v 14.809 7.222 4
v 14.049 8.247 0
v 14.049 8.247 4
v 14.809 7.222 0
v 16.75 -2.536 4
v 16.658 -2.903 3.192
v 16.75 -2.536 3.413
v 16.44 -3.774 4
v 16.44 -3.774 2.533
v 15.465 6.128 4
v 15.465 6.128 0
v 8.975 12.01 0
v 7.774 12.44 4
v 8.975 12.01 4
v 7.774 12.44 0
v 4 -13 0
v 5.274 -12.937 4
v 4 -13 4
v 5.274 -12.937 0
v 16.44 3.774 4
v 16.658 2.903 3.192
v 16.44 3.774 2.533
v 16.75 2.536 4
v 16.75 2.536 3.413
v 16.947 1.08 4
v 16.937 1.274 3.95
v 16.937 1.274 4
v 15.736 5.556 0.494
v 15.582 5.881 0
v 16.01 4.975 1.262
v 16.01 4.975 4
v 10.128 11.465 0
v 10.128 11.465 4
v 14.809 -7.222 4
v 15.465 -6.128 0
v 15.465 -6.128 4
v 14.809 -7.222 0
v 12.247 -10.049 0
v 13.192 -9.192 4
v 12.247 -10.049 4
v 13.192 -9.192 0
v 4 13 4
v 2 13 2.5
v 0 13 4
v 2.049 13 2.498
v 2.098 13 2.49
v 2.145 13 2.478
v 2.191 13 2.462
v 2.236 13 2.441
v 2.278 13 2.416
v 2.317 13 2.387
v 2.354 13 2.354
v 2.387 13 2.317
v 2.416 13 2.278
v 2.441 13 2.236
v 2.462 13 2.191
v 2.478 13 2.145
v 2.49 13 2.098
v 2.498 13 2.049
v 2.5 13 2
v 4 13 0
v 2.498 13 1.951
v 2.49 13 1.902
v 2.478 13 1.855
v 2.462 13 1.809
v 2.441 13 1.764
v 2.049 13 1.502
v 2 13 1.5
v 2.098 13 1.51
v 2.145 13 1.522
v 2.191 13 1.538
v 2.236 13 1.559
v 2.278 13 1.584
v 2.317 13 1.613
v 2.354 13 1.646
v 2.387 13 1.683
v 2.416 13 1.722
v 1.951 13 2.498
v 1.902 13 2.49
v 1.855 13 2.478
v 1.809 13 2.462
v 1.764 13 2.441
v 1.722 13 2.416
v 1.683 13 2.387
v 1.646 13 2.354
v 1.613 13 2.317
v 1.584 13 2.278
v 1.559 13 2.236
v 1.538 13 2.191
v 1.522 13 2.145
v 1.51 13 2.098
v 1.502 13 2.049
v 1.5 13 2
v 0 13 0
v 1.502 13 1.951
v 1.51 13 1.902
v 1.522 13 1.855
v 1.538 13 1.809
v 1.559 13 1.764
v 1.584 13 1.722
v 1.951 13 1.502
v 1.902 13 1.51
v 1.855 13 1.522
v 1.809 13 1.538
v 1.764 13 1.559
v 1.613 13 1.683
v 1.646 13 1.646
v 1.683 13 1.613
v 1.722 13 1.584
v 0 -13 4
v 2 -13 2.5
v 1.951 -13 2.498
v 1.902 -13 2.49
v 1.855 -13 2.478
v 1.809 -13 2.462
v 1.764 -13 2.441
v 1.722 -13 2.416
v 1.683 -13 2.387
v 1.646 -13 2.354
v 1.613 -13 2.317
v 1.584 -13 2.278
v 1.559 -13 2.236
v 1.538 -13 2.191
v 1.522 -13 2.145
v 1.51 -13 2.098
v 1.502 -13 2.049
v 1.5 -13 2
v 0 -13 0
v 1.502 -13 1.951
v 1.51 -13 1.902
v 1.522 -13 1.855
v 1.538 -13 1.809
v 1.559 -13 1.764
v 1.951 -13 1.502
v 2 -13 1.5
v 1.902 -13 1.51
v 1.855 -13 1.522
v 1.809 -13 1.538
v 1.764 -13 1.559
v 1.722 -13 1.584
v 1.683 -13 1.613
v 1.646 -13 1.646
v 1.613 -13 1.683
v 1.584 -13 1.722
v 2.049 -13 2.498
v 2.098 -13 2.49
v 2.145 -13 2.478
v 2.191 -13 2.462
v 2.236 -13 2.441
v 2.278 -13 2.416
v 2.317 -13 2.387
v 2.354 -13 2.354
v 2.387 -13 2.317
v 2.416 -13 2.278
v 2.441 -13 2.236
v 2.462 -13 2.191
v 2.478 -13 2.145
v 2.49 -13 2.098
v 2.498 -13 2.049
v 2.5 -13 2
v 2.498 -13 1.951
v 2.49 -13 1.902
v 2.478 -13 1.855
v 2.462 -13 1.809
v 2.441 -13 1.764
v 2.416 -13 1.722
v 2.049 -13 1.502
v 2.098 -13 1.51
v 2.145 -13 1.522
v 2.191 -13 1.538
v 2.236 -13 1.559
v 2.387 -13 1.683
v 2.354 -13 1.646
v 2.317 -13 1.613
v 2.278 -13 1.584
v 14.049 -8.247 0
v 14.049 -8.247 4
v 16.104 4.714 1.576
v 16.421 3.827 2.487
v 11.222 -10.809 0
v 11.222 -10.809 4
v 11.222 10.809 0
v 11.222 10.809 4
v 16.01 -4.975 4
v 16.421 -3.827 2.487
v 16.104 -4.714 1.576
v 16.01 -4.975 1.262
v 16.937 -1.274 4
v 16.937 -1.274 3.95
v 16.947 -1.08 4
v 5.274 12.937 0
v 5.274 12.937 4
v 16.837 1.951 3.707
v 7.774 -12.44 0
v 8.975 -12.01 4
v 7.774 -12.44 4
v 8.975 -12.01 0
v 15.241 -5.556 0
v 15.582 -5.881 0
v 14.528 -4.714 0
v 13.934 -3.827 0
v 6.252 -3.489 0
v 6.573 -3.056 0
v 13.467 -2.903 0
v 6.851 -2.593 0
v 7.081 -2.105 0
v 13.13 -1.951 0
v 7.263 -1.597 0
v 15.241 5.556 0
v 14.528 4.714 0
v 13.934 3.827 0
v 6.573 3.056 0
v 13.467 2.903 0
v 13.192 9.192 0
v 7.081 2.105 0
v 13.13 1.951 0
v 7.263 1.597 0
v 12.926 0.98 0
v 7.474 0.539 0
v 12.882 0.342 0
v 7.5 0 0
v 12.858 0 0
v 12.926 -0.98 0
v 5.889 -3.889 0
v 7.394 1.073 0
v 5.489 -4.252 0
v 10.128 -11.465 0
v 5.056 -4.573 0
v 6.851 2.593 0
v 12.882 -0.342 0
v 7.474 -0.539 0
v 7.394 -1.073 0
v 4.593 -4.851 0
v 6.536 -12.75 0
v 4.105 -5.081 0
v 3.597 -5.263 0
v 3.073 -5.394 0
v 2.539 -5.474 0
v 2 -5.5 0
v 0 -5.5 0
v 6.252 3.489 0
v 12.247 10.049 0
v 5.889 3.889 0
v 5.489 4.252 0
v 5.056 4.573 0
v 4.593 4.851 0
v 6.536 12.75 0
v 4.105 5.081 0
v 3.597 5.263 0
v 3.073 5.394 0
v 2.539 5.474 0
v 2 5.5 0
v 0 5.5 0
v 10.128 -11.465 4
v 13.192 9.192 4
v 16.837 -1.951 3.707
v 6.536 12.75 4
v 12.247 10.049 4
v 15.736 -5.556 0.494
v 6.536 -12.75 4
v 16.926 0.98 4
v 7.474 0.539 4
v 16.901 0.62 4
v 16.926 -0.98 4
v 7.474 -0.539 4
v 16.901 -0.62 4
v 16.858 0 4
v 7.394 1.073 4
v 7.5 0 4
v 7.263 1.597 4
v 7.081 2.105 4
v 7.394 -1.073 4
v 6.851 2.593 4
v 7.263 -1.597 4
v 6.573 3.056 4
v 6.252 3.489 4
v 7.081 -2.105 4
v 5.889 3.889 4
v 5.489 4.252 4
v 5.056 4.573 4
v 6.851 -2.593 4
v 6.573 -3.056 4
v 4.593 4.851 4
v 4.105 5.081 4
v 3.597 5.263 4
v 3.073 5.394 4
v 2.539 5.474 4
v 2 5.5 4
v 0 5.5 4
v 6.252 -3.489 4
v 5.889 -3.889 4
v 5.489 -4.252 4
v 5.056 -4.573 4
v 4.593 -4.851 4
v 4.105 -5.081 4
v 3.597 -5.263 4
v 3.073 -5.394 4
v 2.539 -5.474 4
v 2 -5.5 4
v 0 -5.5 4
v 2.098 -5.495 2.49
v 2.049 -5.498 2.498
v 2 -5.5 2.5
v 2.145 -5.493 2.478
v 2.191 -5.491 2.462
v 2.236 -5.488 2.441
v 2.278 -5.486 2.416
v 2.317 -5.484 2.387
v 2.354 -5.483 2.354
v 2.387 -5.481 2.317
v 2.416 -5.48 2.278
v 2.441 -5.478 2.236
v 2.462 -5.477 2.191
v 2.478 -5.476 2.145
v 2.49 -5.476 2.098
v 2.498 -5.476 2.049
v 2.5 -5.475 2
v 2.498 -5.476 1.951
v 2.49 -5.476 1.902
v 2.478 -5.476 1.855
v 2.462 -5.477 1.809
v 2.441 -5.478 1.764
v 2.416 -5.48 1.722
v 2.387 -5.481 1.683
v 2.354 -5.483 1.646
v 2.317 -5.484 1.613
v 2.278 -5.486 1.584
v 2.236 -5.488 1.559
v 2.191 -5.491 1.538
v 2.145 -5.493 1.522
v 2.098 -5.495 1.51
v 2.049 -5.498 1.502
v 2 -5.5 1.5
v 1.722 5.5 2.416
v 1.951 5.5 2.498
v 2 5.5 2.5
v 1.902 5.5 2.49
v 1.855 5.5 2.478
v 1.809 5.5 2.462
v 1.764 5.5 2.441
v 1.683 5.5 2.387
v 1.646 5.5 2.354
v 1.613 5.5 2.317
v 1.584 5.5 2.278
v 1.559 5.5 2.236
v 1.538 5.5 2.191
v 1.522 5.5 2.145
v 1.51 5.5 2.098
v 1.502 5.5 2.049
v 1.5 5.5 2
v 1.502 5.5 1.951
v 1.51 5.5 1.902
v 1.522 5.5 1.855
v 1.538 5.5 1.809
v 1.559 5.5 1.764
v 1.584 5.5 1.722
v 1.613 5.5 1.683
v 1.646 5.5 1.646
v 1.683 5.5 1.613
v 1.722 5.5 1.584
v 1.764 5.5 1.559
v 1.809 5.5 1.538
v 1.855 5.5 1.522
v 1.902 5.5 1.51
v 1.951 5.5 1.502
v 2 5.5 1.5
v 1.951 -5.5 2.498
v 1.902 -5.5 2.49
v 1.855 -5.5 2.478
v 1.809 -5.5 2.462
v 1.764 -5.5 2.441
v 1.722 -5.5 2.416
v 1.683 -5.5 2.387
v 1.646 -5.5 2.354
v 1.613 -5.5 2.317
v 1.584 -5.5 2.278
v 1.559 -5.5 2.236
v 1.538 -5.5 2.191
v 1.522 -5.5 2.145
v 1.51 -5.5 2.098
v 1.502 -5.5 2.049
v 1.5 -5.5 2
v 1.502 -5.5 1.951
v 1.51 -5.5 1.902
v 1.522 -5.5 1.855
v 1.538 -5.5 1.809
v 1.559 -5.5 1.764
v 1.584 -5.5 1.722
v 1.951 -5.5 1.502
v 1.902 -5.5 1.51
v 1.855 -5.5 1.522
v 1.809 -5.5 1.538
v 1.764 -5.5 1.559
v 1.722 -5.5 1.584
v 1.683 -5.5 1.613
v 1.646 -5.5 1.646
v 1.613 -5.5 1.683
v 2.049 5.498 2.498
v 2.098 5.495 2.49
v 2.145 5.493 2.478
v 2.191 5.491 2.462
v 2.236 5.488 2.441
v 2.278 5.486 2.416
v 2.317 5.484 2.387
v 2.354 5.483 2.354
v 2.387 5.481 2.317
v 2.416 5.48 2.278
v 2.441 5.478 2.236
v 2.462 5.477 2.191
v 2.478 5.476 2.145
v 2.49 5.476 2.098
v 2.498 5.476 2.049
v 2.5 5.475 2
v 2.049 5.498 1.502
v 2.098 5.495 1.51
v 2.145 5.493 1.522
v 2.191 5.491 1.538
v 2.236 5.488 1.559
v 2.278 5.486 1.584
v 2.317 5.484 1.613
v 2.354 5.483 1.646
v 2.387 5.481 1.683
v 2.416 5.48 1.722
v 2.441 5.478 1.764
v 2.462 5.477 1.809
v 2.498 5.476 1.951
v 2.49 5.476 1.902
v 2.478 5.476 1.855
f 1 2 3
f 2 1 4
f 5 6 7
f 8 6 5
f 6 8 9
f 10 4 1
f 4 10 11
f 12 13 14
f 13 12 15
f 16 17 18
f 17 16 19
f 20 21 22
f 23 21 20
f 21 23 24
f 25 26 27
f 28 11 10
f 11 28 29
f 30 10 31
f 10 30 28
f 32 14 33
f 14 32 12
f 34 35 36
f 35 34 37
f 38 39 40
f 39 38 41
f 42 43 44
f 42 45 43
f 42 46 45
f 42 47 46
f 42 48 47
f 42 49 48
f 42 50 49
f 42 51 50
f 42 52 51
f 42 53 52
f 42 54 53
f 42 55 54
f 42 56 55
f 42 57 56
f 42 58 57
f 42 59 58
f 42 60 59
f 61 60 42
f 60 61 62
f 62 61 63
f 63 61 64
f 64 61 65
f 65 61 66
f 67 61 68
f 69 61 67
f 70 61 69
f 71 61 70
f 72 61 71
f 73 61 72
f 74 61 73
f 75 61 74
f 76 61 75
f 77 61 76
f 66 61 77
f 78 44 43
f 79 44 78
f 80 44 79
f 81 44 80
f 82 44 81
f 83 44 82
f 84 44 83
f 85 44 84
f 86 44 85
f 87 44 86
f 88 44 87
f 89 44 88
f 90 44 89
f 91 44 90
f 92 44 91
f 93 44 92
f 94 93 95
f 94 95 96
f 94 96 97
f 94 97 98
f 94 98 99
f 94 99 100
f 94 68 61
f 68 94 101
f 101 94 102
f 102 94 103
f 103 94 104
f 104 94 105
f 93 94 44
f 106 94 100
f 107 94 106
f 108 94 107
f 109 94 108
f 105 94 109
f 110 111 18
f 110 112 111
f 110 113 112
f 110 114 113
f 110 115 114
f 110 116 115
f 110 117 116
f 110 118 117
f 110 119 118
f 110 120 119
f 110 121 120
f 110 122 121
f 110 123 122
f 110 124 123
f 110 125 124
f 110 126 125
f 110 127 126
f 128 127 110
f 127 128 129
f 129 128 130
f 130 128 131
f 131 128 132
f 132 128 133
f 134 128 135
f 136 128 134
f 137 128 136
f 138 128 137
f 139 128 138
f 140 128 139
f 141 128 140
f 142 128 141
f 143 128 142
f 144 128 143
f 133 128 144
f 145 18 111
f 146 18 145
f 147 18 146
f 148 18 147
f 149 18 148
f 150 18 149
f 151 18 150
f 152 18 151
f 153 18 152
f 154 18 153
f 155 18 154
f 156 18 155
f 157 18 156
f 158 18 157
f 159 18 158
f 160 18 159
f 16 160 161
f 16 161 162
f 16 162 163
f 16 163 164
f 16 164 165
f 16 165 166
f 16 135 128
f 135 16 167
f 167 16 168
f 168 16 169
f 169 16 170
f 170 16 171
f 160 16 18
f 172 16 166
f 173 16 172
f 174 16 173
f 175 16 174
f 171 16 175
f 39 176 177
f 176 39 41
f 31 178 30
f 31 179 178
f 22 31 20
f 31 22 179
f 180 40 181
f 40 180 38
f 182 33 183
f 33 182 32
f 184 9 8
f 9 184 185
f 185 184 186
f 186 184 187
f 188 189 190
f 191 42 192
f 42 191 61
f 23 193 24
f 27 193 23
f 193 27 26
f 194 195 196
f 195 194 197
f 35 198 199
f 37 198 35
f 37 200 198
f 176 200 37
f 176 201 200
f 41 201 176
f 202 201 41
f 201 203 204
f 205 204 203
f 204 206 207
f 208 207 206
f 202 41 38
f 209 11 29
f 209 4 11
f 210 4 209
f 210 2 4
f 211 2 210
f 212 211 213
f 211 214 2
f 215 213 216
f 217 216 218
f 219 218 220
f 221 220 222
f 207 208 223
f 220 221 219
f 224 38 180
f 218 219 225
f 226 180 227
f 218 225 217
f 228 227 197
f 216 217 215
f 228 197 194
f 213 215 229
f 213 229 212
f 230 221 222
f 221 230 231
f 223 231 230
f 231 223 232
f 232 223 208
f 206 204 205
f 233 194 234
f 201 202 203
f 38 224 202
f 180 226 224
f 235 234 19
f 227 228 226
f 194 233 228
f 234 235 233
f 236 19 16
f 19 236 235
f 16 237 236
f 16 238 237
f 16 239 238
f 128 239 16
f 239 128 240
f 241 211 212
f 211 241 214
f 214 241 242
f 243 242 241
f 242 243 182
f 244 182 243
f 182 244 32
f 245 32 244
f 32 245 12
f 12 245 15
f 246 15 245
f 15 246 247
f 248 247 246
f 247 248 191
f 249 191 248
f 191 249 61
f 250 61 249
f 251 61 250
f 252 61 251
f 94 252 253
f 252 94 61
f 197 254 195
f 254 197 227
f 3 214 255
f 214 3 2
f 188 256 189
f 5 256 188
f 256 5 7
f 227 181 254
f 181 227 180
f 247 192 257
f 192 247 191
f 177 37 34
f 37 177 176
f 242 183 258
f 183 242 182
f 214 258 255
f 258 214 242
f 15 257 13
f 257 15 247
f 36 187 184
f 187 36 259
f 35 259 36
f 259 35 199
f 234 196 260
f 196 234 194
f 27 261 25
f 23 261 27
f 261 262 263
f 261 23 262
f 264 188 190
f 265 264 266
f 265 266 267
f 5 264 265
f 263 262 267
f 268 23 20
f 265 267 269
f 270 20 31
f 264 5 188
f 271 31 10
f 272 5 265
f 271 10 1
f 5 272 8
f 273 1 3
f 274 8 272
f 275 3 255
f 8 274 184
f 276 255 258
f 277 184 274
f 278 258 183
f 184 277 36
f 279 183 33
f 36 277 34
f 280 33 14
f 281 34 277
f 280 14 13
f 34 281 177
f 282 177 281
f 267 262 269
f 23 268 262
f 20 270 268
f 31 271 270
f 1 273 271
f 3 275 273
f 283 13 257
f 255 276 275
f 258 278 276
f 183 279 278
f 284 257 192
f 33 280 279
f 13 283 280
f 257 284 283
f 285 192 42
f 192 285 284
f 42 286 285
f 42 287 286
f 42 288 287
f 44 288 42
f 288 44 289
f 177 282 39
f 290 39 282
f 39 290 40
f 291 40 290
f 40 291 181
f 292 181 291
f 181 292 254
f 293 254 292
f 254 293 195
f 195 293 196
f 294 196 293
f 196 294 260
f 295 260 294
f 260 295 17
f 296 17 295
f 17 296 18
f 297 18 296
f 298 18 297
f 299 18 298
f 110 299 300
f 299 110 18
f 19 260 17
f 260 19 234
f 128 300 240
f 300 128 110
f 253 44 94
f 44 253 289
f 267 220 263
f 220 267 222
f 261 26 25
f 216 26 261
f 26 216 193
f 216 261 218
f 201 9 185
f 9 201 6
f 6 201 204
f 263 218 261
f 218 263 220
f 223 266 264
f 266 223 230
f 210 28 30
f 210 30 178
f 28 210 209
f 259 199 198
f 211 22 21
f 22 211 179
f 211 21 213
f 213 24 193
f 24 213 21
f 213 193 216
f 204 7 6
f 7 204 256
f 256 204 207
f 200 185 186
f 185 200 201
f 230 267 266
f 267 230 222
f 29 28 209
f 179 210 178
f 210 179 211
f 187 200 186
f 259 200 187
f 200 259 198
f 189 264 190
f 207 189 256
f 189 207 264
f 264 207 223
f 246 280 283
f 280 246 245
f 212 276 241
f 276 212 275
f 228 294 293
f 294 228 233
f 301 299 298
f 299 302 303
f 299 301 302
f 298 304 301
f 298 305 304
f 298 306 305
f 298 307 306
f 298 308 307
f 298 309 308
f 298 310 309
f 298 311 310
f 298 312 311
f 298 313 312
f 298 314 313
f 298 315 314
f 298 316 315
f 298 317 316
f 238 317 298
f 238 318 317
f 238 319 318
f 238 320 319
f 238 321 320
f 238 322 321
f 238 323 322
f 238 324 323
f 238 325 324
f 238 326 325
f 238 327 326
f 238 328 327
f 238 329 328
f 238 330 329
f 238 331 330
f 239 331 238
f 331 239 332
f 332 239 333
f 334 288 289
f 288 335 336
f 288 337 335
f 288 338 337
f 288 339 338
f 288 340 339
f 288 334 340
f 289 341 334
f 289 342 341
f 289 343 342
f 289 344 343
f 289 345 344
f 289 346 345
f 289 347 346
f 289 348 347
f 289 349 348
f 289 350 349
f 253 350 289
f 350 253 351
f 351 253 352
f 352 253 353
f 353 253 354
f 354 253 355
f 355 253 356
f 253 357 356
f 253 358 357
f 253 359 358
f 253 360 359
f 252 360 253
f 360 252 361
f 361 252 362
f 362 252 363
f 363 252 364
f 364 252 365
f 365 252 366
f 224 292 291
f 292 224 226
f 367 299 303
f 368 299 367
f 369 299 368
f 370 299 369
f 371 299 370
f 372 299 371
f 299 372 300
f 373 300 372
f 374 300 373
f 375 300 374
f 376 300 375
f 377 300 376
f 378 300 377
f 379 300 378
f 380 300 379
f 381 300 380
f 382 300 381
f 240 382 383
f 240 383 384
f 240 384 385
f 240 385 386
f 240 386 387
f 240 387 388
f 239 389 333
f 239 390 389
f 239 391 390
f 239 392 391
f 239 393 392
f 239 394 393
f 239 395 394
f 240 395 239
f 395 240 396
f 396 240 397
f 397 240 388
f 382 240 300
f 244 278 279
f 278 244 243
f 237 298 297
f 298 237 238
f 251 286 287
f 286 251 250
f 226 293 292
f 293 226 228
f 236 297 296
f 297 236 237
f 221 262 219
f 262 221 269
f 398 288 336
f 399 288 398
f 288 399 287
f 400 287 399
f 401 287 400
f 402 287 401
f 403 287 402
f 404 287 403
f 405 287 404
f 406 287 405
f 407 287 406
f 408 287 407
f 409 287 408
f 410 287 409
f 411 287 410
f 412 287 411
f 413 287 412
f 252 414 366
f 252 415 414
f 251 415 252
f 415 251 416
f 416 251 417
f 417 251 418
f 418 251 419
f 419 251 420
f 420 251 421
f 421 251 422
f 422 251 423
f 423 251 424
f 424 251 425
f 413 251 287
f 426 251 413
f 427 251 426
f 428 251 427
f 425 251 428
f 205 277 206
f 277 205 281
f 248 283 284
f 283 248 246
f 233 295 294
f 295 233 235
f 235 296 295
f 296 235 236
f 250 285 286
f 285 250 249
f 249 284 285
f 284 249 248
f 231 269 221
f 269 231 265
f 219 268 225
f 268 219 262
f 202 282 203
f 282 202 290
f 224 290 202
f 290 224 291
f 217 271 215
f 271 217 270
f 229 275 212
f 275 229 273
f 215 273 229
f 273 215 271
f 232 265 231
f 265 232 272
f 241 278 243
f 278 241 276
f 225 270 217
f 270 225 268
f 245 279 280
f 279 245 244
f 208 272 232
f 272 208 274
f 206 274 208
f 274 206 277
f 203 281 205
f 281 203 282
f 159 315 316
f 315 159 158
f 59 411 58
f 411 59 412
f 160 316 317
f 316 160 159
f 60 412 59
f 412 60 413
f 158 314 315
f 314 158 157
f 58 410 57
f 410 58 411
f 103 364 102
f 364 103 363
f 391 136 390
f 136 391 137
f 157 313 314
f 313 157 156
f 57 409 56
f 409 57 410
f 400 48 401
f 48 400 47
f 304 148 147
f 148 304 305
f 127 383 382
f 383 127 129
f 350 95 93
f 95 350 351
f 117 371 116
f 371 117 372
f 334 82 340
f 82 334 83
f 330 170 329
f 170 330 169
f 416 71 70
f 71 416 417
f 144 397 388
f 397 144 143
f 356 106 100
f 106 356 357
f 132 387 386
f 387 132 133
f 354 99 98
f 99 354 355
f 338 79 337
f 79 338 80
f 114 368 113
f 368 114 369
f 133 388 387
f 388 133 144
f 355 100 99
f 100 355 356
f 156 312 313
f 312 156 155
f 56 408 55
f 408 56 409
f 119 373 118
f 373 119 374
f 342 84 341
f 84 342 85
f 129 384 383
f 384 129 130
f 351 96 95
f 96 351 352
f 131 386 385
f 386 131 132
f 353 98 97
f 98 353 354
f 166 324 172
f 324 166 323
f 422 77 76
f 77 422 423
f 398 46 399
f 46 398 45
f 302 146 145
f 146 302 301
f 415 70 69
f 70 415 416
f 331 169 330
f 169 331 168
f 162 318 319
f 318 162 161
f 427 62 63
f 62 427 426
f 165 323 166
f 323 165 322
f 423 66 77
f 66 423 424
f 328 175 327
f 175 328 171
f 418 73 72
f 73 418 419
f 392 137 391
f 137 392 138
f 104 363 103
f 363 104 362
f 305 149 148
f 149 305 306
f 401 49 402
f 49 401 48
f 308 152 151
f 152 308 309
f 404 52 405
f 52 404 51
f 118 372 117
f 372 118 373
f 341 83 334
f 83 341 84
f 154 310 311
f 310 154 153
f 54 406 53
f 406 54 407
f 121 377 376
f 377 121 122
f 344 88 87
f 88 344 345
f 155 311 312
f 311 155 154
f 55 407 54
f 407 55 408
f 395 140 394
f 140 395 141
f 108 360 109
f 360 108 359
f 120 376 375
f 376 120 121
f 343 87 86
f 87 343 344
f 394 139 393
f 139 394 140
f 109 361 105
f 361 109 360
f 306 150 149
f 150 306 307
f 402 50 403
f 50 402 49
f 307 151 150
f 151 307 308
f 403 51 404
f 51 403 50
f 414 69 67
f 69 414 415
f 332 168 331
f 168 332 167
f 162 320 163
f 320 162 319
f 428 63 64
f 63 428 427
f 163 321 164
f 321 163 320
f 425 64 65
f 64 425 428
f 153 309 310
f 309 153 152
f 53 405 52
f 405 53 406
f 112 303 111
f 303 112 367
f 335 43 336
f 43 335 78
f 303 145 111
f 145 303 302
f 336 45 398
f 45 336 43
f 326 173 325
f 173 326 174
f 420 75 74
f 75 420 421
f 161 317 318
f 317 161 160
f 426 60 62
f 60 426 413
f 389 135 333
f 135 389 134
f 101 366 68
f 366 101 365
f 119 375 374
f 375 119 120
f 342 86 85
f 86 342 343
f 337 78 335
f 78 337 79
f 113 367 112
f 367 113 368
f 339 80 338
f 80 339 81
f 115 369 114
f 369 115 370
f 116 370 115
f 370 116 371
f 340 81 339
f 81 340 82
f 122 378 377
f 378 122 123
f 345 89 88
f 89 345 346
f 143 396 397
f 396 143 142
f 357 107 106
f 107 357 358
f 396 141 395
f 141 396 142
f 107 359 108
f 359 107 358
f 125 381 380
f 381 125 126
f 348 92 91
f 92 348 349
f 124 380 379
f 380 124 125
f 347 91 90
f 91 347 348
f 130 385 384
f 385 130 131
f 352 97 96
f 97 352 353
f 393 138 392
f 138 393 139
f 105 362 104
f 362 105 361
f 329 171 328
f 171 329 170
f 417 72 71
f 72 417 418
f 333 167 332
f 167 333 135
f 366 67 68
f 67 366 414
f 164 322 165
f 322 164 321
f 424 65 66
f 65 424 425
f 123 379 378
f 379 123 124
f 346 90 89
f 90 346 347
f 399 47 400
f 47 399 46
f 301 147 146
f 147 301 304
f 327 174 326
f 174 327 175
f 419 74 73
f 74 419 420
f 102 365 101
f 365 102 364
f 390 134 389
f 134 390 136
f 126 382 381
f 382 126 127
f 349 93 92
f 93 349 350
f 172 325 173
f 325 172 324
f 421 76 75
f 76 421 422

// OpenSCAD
$fn=64;
corner_radius=5;
height=2;
plate_height=1;
plate_length=44;
plate_width=29.3;
wall_thickness=5;

rotator_mount_diameter=26;

center_x=plate_length/2-corner_radius;
center_y=plate_width/2-corner_radius;

rotator_base_height=1;
rotator_top_diameter=11;

diff=0.1;

difference() {
    hull() {
        cylinder(h=2*height, d=rotator_mount_diameter);
        translate([4,0,0]) cylinder(h=2*height, d=rotator_mount_diameter);
    }
    translate([-30,-15,-1]) cube([30,30,30]);
    translate([15,0,-12]) rotate([0,45,0]) cylinder(h=20,d=20);
    translate([0,0,-diff]) hull() {
        cylinder(h=2*height+2*diff,d=rotator_top_diameter);
        translate([2,0,0]) cylinder(h=2*height+2*diff,d=rotator_top_diameter);
    }
    translate([height,0,height]) rotate([90,0,0]) cylinder(h=50, d=1, center=true);
}
